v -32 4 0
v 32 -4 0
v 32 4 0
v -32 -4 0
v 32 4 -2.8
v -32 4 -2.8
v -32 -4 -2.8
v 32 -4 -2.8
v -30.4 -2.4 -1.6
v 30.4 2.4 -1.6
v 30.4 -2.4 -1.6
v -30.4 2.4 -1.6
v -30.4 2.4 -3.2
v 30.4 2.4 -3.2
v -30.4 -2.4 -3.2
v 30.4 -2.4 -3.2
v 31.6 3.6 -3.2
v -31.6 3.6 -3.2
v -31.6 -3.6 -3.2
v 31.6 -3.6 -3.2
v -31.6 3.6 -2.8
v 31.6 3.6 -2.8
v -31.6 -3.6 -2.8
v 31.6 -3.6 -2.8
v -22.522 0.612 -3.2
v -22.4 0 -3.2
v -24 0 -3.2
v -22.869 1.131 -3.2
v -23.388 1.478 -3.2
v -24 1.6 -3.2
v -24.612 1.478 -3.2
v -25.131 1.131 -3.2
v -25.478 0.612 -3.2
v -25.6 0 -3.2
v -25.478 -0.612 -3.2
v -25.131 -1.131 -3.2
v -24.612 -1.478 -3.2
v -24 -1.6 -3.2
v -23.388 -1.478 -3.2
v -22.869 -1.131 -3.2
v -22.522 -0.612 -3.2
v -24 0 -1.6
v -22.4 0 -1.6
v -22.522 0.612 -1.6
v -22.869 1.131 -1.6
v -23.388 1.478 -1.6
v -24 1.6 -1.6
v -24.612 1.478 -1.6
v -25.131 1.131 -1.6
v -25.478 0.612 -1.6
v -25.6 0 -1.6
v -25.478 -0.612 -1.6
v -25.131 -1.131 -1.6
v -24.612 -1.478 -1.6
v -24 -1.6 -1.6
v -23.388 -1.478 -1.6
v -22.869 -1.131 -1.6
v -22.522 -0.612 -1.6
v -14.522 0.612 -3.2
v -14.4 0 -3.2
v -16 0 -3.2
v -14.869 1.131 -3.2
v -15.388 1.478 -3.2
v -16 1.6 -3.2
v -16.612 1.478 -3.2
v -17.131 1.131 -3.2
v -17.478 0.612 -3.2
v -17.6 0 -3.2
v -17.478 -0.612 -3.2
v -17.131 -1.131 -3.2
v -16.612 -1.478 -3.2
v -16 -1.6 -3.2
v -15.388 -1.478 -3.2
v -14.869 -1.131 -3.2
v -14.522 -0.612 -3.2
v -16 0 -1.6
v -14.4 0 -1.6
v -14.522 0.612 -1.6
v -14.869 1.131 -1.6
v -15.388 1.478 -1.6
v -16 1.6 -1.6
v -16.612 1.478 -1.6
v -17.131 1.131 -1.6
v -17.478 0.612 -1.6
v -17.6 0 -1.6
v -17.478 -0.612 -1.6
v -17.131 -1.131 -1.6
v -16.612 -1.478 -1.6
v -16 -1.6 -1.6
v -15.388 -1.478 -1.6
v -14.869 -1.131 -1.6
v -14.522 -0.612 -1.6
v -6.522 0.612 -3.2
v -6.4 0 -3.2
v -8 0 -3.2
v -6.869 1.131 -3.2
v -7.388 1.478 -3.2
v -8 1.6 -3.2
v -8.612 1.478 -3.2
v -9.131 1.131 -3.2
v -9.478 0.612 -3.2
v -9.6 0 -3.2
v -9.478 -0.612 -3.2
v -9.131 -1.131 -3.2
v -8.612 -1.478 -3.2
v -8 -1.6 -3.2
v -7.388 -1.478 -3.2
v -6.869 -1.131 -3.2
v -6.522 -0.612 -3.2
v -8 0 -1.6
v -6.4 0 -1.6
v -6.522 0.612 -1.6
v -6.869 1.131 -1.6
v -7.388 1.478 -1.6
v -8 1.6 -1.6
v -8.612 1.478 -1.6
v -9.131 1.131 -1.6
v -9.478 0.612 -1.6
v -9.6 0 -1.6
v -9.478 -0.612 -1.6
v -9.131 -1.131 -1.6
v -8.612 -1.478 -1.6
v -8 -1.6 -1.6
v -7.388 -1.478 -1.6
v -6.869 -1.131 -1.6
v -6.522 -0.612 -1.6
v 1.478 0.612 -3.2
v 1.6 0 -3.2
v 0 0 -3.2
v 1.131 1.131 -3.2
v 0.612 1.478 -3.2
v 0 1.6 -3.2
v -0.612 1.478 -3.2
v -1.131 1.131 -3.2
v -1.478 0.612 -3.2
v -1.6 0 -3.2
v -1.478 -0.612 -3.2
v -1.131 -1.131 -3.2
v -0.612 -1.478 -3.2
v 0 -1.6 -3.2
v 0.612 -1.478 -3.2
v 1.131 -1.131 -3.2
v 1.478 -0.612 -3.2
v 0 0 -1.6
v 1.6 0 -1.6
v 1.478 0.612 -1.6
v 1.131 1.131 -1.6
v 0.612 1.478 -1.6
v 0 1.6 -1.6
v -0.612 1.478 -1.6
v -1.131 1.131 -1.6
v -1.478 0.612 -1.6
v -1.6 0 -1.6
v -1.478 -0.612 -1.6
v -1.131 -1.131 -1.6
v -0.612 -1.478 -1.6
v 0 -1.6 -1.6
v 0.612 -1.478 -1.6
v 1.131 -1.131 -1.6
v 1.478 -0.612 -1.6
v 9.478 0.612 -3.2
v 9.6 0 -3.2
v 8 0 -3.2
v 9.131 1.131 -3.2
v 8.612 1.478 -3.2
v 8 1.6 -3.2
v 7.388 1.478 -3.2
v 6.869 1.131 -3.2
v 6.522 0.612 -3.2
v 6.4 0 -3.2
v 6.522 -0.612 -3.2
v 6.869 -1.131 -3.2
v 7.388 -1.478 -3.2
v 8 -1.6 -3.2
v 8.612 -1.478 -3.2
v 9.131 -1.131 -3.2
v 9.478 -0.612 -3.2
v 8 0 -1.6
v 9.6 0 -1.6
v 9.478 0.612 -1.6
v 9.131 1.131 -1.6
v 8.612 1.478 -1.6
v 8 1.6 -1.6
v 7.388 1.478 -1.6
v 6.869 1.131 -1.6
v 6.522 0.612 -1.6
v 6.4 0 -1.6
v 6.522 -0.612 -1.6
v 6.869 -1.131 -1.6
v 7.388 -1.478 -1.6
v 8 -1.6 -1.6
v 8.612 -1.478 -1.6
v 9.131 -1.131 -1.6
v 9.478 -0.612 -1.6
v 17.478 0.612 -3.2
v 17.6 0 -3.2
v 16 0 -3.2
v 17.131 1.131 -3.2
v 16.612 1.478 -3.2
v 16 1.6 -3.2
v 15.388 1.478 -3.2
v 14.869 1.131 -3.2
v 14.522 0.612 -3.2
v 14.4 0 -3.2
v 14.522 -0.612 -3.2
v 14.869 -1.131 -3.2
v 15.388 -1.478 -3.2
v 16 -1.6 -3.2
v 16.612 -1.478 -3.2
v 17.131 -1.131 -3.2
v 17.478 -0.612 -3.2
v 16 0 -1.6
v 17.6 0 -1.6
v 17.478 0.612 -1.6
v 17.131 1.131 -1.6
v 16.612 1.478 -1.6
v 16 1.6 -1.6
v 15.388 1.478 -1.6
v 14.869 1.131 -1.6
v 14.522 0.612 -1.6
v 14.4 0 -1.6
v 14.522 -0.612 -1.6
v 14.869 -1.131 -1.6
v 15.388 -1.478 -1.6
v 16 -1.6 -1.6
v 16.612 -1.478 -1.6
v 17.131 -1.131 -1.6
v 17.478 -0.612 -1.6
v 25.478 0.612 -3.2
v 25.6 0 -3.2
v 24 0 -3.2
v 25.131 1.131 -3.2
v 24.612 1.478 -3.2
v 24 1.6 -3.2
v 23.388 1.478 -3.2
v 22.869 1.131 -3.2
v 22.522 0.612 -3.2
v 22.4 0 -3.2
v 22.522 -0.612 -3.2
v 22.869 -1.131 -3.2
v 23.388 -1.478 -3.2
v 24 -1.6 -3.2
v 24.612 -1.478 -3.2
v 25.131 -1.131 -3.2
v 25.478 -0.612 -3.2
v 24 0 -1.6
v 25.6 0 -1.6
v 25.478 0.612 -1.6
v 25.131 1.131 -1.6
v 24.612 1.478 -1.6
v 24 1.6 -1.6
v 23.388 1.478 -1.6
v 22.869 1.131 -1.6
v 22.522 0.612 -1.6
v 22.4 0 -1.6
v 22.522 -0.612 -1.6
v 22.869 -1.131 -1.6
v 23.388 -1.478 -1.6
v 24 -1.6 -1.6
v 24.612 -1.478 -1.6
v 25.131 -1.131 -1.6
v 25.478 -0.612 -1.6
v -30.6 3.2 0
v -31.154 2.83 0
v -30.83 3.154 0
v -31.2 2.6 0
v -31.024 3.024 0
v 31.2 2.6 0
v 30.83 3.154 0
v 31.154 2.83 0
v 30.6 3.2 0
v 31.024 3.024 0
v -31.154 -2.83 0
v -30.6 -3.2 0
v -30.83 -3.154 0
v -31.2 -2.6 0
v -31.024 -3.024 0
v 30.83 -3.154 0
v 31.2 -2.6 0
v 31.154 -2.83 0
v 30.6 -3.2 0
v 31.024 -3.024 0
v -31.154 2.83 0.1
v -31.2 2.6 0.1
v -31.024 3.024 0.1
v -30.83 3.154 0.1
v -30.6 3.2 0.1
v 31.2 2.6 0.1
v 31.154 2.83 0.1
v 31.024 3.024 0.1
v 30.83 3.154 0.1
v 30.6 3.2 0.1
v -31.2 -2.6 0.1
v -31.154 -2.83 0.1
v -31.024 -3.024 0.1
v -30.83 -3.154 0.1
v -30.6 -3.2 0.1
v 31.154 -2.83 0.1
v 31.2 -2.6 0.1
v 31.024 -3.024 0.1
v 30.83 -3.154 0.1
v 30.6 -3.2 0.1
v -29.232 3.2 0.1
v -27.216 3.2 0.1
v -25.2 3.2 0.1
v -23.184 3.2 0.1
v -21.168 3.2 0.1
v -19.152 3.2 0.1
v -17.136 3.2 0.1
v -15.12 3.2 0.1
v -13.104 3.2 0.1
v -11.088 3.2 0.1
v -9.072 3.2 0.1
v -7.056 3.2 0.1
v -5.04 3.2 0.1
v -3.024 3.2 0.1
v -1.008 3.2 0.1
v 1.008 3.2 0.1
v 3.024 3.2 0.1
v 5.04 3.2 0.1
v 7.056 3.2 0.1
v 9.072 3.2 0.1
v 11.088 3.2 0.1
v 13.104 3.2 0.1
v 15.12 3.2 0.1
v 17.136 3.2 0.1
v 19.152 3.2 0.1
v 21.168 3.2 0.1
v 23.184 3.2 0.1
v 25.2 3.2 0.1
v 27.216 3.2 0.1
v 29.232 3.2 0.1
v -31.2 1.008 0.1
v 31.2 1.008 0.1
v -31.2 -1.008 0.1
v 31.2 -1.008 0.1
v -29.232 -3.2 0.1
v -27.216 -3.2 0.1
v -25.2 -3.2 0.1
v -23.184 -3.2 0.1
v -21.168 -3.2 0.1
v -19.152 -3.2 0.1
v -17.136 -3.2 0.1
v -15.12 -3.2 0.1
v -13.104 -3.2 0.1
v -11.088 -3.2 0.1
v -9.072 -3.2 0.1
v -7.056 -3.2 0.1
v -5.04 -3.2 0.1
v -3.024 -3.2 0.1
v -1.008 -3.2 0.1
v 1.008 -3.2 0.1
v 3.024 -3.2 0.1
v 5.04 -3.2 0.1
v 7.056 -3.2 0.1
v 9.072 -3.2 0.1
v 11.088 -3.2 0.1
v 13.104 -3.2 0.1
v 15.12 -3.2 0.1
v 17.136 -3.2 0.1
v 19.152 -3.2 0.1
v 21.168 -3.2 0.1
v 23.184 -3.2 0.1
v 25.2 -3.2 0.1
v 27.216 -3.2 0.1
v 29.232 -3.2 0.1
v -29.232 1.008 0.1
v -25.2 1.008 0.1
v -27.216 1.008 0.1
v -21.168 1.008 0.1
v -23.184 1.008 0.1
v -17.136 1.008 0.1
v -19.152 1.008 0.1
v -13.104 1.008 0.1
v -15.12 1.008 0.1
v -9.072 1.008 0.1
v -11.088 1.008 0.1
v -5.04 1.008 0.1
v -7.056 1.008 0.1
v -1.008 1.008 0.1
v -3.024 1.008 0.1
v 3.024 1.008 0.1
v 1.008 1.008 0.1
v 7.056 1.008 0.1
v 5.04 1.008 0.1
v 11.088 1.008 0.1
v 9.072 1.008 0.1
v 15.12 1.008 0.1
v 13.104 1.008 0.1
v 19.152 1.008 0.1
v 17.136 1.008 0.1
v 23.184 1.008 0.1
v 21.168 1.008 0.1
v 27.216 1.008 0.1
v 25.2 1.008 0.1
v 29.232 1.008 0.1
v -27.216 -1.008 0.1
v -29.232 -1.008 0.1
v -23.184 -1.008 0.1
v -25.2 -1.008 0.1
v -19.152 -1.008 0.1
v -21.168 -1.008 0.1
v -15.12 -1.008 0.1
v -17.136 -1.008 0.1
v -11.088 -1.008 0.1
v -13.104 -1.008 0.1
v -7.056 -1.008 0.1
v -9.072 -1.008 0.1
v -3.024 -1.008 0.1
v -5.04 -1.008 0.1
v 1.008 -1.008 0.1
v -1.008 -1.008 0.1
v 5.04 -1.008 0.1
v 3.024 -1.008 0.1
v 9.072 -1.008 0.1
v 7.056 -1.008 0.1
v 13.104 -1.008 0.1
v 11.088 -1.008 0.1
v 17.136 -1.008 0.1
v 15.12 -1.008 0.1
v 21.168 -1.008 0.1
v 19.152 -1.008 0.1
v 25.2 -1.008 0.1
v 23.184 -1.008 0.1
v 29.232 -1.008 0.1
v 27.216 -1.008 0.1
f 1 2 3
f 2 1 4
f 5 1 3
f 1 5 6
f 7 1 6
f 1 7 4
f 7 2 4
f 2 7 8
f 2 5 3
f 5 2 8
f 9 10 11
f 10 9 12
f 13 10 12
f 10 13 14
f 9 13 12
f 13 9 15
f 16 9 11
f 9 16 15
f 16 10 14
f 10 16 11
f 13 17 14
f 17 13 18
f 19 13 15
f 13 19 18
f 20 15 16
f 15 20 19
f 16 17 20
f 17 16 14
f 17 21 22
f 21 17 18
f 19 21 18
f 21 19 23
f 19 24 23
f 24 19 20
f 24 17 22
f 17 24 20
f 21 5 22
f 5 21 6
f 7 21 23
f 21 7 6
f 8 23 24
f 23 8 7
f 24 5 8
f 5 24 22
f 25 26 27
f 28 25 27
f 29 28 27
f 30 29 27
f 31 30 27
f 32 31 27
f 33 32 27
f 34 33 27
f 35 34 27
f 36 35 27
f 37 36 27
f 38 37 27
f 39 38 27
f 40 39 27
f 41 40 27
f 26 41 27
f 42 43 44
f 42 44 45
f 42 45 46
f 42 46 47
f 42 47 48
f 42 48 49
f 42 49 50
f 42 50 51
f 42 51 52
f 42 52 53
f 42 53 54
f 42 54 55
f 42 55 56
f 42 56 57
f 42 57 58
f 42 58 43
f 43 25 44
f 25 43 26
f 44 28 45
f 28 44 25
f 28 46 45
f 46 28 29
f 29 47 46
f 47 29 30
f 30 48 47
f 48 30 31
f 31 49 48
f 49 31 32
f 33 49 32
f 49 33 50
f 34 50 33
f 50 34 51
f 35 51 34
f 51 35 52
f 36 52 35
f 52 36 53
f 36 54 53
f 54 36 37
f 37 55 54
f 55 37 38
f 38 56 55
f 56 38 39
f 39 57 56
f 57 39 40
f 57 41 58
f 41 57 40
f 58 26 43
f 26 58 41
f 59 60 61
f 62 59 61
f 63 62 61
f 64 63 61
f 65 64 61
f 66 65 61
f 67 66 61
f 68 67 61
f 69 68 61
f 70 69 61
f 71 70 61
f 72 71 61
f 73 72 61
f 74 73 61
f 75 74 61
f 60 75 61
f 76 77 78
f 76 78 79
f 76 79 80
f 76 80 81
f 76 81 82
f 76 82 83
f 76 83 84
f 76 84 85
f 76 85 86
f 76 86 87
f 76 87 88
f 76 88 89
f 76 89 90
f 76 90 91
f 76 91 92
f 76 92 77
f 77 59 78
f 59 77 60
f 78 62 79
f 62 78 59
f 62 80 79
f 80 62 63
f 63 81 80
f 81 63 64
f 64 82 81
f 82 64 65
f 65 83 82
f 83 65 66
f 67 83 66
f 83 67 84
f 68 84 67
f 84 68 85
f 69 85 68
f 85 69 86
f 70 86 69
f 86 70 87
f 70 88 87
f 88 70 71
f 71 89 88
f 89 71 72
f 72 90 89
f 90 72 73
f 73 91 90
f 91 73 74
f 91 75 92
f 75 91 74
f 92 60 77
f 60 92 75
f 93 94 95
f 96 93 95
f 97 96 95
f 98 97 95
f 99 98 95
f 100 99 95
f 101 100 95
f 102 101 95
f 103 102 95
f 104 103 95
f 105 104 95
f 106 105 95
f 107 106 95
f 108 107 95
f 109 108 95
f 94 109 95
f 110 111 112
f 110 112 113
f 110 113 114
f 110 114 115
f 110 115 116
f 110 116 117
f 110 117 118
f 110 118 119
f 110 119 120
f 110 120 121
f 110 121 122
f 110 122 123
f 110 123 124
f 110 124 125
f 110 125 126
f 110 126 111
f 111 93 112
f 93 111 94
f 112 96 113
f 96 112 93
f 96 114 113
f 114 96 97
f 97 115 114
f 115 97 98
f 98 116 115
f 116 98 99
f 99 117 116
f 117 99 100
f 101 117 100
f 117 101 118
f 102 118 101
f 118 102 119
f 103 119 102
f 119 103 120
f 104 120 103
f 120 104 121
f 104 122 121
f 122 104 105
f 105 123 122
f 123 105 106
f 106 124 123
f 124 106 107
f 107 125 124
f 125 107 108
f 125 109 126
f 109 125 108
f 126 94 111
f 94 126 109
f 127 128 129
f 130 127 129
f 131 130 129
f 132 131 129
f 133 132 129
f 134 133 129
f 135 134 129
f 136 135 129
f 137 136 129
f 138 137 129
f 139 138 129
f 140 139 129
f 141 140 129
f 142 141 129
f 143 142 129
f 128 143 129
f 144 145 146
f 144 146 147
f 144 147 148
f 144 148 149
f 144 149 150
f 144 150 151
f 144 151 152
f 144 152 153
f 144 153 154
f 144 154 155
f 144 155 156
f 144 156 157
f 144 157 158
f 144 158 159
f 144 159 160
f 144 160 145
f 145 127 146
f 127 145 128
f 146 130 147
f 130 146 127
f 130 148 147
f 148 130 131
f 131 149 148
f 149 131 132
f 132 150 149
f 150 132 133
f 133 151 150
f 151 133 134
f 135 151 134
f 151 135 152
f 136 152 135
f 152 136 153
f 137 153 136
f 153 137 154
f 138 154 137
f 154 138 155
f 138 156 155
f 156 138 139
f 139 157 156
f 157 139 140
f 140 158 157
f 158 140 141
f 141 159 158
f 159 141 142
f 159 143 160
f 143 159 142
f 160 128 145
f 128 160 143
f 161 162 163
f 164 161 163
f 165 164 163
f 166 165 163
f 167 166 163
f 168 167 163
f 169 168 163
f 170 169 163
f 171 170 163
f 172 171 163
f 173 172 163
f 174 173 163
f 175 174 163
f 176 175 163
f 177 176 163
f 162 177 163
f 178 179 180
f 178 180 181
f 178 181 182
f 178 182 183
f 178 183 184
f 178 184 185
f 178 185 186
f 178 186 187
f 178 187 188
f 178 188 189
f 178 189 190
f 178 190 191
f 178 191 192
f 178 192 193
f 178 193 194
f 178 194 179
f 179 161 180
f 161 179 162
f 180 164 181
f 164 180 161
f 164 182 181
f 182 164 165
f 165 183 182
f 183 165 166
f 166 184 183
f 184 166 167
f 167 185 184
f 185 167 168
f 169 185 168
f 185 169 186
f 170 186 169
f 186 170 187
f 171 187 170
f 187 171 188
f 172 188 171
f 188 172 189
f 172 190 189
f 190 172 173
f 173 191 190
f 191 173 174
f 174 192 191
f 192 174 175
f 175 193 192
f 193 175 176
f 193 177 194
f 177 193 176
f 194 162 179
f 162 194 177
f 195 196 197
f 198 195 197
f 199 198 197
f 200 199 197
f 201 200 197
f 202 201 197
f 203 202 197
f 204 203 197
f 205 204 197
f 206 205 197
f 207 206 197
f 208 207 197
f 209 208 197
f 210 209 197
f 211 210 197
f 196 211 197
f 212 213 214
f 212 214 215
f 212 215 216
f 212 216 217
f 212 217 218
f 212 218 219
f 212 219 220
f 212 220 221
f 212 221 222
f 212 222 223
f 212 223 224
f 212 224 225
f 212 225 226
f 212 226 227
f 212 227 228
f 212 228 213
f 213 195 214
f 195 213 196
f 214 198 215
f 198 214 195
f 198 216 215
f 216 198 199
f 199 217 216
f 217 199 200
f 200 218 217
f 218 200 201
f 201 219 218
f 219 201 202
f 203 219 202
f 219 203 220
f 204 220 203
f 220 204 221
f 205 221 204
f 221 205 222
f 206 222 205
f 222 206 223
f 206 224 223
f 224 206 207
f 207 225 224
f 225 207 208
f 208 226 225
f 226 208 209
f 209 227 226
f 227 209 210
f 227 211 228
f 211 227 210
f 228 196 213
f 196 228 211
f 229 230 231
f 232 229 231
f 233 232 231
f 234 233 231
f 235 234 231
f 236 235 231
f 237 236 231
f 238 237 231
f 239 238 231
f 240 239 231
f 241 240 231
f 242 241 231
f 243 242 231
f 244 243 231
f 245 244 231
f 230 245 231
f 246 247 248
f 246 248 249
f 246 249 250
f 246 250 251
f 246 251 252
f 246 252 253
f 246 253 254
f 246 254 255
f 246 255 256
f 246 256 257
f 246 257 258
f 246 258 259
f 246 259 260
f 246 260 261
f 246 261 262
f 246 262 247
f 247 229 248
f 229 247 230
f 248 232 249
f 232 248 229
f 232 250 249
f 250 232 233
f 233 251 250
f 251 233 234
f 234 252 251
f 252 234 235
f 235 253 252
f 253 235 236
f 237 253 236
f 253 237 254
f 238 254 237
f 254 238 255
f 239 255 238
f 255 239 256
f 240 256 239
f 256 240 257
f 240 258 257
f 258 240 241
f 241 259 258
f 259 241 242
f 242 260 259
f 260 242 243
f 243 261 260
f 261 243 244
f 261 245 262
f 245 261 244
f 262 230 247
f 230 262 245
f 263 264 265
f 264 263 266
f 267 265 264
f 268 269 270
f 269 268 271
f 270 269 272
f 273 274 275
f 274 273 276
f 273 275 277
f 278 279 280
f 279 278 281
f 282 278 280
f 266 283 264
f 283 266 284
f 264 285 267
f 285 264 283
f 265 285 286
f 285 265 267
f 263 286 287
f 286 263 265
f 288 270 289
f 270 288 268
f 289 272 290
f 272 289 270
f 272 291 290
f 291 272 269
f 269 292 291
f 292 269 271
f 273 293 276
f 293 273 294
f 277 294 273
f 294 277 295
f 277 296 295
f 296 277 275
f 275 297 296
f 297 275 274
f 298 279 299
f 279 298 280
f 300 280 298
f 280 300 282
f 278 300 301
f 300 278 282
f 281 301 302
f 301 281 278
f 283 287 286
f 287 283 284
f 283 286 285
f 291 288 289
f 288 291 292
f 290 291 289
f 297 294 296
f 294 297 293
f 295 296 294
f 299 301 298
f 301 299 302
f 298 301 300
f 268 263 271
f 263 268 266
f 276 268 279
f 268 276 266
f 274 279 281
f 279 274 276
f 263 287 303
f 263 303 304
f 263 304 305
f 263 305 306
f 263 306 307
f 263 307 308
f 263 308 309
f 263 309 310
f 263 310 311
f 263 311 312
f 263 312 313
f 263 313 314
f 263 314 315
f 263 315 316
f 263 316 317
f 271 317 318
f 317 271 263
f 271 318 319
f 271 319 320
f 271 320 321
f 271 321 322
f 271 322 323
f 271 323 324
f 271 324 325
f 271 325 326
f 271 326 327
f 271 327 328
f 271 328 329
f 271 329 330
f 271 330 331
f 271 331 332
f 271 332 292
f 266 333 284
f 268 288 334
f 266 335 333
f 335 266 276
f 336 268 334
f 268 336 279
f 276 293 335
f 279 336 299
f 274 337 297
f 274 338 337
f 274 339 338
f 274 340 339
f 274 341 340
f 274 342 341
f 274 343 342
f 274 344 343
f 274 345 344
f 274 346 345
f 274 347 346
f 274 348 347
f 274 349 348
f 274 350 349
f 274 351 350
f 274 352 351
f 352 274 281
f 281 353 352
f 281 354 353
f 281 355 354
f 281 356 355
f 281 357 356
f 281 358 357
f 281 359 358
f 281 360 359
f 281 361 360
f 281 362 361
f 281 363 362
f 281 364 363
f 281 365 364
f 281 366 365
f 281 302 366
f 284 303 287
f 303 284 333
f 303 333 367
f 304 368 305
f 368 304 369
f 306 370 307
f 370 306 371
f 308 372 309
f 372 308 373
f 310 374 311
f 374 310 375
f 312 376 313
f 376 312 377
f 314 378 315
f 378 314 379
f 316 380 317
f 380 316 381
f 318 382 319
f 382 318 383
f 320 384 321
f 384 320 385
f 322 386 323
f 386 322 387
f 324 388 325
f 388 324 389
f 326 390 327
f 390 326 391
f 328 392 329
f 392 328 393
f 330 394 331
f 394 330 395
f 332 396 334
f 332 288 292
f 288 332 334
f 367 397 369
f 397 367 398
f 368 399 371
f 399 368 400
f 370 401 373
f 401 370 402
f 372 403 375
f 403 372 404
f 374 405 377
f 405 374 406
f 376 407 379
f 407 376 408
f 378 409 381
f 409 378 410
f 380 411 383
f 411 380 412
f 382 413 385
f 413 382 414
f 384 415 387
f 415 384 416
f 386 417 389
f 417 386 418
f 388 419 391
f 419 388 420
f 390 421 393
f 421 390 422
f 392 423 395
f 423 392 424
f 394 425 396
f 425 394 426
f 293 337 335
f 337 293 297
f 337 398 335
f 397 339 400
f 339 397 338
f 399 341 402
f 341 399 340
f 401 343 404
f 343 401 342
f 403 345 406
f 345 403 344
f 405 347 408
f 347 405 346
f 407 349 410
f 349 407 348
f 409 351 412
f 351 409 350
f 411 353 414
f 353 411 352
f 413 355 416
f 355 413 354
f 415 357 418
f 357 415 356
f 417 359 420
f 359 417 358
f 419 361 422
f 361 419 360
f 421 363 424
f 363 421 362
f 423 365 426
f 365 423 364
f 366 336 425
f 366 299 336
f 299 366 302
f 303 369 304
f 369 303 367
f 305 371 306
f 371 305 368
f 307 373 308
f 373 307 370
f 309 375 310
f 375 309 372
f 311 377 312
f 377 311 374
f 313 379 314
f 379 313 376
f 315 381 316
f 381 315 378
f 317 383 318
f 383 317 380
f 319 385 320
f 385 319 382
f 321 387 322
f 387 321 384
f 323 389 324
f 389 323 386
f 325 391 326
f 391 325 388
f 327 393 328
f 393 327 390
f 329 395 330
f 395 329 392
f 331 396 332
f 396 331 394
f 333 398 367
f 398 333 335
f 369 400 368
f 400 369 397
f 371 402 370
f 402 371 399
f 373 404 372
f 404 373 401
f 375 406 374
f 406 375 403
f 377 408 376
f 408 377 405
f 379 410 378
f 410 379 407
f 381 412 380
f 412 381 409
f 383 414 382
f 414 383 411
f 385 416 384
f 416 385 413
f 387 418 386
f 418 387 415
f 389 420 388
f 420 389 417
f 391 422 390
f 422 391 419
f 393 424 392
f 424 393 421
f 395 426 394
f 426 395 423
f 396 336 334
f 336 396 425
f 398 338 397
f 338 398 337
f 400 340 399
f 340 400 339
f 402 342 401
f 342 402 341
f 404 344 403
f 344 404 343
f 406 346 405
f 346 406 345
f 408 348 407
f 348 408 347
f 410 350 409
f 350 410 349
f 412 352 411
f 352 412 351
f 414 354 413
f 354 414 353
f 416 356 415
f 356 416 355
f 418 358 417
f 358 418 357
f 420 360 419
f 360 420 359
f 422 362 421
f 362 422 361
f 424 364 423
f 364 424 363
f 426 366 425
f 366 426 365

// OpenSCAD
use <../lib.scad>
use <4162.scad>
use <6142617ad.scad>
function ldraw_lib__4162dno() = [
// 0 Tile  1 x  8 with Chequered Sticker
// 0 Name: 4162dno.dat
// 0 Author: Alfred Schmitz [AlfredS]
// 0 !LDRAW_ORG Shortcut UPDATE 2026-09
// 0 !LICENSE Licensed under CC BY 4.0 : see CAreadme.txt
// 
// 0 BFC CERTIFY CCW
  [0,"BFC","CERTIFY"],
  [0,"BFC","CCW"],
// 
// 0 !CATEGORY Sticker Shortcut
// 0 !KEYWORDS Camaro, Chevrolet, Drag, Race, Set 75874, Speed Champions
// 
// 0 !HISTORY 2026-09-30 [OrionP] Official Update 2026-09
// 
// 1 16 0 0 0 1 0 0 0 1 0 0 0 1 4162.dat
  [1,16,0,0,0,1,0,0,0,1,0,0,0,1, ldraw_lib__4162()],
// 1 16 0 0 0 1 0 0 0 1 0 0 0 1 6142617ad.dat
  [1,16,0,0,0,1,0,0,0,1,0,0,0,1, ldraw_lib__6142617ad()],
];
module ldraw_lib__4162dno(step=0, col=false, unit=2/5, alt=false, line=0.2, solid=!$preview)
    makepoly(ldraw_lib__4162dno(), step=step, col=col, unit=unit, alt=alt, line=line, solid=solid);
ldraw_lib__4162dno(line=0.2);
